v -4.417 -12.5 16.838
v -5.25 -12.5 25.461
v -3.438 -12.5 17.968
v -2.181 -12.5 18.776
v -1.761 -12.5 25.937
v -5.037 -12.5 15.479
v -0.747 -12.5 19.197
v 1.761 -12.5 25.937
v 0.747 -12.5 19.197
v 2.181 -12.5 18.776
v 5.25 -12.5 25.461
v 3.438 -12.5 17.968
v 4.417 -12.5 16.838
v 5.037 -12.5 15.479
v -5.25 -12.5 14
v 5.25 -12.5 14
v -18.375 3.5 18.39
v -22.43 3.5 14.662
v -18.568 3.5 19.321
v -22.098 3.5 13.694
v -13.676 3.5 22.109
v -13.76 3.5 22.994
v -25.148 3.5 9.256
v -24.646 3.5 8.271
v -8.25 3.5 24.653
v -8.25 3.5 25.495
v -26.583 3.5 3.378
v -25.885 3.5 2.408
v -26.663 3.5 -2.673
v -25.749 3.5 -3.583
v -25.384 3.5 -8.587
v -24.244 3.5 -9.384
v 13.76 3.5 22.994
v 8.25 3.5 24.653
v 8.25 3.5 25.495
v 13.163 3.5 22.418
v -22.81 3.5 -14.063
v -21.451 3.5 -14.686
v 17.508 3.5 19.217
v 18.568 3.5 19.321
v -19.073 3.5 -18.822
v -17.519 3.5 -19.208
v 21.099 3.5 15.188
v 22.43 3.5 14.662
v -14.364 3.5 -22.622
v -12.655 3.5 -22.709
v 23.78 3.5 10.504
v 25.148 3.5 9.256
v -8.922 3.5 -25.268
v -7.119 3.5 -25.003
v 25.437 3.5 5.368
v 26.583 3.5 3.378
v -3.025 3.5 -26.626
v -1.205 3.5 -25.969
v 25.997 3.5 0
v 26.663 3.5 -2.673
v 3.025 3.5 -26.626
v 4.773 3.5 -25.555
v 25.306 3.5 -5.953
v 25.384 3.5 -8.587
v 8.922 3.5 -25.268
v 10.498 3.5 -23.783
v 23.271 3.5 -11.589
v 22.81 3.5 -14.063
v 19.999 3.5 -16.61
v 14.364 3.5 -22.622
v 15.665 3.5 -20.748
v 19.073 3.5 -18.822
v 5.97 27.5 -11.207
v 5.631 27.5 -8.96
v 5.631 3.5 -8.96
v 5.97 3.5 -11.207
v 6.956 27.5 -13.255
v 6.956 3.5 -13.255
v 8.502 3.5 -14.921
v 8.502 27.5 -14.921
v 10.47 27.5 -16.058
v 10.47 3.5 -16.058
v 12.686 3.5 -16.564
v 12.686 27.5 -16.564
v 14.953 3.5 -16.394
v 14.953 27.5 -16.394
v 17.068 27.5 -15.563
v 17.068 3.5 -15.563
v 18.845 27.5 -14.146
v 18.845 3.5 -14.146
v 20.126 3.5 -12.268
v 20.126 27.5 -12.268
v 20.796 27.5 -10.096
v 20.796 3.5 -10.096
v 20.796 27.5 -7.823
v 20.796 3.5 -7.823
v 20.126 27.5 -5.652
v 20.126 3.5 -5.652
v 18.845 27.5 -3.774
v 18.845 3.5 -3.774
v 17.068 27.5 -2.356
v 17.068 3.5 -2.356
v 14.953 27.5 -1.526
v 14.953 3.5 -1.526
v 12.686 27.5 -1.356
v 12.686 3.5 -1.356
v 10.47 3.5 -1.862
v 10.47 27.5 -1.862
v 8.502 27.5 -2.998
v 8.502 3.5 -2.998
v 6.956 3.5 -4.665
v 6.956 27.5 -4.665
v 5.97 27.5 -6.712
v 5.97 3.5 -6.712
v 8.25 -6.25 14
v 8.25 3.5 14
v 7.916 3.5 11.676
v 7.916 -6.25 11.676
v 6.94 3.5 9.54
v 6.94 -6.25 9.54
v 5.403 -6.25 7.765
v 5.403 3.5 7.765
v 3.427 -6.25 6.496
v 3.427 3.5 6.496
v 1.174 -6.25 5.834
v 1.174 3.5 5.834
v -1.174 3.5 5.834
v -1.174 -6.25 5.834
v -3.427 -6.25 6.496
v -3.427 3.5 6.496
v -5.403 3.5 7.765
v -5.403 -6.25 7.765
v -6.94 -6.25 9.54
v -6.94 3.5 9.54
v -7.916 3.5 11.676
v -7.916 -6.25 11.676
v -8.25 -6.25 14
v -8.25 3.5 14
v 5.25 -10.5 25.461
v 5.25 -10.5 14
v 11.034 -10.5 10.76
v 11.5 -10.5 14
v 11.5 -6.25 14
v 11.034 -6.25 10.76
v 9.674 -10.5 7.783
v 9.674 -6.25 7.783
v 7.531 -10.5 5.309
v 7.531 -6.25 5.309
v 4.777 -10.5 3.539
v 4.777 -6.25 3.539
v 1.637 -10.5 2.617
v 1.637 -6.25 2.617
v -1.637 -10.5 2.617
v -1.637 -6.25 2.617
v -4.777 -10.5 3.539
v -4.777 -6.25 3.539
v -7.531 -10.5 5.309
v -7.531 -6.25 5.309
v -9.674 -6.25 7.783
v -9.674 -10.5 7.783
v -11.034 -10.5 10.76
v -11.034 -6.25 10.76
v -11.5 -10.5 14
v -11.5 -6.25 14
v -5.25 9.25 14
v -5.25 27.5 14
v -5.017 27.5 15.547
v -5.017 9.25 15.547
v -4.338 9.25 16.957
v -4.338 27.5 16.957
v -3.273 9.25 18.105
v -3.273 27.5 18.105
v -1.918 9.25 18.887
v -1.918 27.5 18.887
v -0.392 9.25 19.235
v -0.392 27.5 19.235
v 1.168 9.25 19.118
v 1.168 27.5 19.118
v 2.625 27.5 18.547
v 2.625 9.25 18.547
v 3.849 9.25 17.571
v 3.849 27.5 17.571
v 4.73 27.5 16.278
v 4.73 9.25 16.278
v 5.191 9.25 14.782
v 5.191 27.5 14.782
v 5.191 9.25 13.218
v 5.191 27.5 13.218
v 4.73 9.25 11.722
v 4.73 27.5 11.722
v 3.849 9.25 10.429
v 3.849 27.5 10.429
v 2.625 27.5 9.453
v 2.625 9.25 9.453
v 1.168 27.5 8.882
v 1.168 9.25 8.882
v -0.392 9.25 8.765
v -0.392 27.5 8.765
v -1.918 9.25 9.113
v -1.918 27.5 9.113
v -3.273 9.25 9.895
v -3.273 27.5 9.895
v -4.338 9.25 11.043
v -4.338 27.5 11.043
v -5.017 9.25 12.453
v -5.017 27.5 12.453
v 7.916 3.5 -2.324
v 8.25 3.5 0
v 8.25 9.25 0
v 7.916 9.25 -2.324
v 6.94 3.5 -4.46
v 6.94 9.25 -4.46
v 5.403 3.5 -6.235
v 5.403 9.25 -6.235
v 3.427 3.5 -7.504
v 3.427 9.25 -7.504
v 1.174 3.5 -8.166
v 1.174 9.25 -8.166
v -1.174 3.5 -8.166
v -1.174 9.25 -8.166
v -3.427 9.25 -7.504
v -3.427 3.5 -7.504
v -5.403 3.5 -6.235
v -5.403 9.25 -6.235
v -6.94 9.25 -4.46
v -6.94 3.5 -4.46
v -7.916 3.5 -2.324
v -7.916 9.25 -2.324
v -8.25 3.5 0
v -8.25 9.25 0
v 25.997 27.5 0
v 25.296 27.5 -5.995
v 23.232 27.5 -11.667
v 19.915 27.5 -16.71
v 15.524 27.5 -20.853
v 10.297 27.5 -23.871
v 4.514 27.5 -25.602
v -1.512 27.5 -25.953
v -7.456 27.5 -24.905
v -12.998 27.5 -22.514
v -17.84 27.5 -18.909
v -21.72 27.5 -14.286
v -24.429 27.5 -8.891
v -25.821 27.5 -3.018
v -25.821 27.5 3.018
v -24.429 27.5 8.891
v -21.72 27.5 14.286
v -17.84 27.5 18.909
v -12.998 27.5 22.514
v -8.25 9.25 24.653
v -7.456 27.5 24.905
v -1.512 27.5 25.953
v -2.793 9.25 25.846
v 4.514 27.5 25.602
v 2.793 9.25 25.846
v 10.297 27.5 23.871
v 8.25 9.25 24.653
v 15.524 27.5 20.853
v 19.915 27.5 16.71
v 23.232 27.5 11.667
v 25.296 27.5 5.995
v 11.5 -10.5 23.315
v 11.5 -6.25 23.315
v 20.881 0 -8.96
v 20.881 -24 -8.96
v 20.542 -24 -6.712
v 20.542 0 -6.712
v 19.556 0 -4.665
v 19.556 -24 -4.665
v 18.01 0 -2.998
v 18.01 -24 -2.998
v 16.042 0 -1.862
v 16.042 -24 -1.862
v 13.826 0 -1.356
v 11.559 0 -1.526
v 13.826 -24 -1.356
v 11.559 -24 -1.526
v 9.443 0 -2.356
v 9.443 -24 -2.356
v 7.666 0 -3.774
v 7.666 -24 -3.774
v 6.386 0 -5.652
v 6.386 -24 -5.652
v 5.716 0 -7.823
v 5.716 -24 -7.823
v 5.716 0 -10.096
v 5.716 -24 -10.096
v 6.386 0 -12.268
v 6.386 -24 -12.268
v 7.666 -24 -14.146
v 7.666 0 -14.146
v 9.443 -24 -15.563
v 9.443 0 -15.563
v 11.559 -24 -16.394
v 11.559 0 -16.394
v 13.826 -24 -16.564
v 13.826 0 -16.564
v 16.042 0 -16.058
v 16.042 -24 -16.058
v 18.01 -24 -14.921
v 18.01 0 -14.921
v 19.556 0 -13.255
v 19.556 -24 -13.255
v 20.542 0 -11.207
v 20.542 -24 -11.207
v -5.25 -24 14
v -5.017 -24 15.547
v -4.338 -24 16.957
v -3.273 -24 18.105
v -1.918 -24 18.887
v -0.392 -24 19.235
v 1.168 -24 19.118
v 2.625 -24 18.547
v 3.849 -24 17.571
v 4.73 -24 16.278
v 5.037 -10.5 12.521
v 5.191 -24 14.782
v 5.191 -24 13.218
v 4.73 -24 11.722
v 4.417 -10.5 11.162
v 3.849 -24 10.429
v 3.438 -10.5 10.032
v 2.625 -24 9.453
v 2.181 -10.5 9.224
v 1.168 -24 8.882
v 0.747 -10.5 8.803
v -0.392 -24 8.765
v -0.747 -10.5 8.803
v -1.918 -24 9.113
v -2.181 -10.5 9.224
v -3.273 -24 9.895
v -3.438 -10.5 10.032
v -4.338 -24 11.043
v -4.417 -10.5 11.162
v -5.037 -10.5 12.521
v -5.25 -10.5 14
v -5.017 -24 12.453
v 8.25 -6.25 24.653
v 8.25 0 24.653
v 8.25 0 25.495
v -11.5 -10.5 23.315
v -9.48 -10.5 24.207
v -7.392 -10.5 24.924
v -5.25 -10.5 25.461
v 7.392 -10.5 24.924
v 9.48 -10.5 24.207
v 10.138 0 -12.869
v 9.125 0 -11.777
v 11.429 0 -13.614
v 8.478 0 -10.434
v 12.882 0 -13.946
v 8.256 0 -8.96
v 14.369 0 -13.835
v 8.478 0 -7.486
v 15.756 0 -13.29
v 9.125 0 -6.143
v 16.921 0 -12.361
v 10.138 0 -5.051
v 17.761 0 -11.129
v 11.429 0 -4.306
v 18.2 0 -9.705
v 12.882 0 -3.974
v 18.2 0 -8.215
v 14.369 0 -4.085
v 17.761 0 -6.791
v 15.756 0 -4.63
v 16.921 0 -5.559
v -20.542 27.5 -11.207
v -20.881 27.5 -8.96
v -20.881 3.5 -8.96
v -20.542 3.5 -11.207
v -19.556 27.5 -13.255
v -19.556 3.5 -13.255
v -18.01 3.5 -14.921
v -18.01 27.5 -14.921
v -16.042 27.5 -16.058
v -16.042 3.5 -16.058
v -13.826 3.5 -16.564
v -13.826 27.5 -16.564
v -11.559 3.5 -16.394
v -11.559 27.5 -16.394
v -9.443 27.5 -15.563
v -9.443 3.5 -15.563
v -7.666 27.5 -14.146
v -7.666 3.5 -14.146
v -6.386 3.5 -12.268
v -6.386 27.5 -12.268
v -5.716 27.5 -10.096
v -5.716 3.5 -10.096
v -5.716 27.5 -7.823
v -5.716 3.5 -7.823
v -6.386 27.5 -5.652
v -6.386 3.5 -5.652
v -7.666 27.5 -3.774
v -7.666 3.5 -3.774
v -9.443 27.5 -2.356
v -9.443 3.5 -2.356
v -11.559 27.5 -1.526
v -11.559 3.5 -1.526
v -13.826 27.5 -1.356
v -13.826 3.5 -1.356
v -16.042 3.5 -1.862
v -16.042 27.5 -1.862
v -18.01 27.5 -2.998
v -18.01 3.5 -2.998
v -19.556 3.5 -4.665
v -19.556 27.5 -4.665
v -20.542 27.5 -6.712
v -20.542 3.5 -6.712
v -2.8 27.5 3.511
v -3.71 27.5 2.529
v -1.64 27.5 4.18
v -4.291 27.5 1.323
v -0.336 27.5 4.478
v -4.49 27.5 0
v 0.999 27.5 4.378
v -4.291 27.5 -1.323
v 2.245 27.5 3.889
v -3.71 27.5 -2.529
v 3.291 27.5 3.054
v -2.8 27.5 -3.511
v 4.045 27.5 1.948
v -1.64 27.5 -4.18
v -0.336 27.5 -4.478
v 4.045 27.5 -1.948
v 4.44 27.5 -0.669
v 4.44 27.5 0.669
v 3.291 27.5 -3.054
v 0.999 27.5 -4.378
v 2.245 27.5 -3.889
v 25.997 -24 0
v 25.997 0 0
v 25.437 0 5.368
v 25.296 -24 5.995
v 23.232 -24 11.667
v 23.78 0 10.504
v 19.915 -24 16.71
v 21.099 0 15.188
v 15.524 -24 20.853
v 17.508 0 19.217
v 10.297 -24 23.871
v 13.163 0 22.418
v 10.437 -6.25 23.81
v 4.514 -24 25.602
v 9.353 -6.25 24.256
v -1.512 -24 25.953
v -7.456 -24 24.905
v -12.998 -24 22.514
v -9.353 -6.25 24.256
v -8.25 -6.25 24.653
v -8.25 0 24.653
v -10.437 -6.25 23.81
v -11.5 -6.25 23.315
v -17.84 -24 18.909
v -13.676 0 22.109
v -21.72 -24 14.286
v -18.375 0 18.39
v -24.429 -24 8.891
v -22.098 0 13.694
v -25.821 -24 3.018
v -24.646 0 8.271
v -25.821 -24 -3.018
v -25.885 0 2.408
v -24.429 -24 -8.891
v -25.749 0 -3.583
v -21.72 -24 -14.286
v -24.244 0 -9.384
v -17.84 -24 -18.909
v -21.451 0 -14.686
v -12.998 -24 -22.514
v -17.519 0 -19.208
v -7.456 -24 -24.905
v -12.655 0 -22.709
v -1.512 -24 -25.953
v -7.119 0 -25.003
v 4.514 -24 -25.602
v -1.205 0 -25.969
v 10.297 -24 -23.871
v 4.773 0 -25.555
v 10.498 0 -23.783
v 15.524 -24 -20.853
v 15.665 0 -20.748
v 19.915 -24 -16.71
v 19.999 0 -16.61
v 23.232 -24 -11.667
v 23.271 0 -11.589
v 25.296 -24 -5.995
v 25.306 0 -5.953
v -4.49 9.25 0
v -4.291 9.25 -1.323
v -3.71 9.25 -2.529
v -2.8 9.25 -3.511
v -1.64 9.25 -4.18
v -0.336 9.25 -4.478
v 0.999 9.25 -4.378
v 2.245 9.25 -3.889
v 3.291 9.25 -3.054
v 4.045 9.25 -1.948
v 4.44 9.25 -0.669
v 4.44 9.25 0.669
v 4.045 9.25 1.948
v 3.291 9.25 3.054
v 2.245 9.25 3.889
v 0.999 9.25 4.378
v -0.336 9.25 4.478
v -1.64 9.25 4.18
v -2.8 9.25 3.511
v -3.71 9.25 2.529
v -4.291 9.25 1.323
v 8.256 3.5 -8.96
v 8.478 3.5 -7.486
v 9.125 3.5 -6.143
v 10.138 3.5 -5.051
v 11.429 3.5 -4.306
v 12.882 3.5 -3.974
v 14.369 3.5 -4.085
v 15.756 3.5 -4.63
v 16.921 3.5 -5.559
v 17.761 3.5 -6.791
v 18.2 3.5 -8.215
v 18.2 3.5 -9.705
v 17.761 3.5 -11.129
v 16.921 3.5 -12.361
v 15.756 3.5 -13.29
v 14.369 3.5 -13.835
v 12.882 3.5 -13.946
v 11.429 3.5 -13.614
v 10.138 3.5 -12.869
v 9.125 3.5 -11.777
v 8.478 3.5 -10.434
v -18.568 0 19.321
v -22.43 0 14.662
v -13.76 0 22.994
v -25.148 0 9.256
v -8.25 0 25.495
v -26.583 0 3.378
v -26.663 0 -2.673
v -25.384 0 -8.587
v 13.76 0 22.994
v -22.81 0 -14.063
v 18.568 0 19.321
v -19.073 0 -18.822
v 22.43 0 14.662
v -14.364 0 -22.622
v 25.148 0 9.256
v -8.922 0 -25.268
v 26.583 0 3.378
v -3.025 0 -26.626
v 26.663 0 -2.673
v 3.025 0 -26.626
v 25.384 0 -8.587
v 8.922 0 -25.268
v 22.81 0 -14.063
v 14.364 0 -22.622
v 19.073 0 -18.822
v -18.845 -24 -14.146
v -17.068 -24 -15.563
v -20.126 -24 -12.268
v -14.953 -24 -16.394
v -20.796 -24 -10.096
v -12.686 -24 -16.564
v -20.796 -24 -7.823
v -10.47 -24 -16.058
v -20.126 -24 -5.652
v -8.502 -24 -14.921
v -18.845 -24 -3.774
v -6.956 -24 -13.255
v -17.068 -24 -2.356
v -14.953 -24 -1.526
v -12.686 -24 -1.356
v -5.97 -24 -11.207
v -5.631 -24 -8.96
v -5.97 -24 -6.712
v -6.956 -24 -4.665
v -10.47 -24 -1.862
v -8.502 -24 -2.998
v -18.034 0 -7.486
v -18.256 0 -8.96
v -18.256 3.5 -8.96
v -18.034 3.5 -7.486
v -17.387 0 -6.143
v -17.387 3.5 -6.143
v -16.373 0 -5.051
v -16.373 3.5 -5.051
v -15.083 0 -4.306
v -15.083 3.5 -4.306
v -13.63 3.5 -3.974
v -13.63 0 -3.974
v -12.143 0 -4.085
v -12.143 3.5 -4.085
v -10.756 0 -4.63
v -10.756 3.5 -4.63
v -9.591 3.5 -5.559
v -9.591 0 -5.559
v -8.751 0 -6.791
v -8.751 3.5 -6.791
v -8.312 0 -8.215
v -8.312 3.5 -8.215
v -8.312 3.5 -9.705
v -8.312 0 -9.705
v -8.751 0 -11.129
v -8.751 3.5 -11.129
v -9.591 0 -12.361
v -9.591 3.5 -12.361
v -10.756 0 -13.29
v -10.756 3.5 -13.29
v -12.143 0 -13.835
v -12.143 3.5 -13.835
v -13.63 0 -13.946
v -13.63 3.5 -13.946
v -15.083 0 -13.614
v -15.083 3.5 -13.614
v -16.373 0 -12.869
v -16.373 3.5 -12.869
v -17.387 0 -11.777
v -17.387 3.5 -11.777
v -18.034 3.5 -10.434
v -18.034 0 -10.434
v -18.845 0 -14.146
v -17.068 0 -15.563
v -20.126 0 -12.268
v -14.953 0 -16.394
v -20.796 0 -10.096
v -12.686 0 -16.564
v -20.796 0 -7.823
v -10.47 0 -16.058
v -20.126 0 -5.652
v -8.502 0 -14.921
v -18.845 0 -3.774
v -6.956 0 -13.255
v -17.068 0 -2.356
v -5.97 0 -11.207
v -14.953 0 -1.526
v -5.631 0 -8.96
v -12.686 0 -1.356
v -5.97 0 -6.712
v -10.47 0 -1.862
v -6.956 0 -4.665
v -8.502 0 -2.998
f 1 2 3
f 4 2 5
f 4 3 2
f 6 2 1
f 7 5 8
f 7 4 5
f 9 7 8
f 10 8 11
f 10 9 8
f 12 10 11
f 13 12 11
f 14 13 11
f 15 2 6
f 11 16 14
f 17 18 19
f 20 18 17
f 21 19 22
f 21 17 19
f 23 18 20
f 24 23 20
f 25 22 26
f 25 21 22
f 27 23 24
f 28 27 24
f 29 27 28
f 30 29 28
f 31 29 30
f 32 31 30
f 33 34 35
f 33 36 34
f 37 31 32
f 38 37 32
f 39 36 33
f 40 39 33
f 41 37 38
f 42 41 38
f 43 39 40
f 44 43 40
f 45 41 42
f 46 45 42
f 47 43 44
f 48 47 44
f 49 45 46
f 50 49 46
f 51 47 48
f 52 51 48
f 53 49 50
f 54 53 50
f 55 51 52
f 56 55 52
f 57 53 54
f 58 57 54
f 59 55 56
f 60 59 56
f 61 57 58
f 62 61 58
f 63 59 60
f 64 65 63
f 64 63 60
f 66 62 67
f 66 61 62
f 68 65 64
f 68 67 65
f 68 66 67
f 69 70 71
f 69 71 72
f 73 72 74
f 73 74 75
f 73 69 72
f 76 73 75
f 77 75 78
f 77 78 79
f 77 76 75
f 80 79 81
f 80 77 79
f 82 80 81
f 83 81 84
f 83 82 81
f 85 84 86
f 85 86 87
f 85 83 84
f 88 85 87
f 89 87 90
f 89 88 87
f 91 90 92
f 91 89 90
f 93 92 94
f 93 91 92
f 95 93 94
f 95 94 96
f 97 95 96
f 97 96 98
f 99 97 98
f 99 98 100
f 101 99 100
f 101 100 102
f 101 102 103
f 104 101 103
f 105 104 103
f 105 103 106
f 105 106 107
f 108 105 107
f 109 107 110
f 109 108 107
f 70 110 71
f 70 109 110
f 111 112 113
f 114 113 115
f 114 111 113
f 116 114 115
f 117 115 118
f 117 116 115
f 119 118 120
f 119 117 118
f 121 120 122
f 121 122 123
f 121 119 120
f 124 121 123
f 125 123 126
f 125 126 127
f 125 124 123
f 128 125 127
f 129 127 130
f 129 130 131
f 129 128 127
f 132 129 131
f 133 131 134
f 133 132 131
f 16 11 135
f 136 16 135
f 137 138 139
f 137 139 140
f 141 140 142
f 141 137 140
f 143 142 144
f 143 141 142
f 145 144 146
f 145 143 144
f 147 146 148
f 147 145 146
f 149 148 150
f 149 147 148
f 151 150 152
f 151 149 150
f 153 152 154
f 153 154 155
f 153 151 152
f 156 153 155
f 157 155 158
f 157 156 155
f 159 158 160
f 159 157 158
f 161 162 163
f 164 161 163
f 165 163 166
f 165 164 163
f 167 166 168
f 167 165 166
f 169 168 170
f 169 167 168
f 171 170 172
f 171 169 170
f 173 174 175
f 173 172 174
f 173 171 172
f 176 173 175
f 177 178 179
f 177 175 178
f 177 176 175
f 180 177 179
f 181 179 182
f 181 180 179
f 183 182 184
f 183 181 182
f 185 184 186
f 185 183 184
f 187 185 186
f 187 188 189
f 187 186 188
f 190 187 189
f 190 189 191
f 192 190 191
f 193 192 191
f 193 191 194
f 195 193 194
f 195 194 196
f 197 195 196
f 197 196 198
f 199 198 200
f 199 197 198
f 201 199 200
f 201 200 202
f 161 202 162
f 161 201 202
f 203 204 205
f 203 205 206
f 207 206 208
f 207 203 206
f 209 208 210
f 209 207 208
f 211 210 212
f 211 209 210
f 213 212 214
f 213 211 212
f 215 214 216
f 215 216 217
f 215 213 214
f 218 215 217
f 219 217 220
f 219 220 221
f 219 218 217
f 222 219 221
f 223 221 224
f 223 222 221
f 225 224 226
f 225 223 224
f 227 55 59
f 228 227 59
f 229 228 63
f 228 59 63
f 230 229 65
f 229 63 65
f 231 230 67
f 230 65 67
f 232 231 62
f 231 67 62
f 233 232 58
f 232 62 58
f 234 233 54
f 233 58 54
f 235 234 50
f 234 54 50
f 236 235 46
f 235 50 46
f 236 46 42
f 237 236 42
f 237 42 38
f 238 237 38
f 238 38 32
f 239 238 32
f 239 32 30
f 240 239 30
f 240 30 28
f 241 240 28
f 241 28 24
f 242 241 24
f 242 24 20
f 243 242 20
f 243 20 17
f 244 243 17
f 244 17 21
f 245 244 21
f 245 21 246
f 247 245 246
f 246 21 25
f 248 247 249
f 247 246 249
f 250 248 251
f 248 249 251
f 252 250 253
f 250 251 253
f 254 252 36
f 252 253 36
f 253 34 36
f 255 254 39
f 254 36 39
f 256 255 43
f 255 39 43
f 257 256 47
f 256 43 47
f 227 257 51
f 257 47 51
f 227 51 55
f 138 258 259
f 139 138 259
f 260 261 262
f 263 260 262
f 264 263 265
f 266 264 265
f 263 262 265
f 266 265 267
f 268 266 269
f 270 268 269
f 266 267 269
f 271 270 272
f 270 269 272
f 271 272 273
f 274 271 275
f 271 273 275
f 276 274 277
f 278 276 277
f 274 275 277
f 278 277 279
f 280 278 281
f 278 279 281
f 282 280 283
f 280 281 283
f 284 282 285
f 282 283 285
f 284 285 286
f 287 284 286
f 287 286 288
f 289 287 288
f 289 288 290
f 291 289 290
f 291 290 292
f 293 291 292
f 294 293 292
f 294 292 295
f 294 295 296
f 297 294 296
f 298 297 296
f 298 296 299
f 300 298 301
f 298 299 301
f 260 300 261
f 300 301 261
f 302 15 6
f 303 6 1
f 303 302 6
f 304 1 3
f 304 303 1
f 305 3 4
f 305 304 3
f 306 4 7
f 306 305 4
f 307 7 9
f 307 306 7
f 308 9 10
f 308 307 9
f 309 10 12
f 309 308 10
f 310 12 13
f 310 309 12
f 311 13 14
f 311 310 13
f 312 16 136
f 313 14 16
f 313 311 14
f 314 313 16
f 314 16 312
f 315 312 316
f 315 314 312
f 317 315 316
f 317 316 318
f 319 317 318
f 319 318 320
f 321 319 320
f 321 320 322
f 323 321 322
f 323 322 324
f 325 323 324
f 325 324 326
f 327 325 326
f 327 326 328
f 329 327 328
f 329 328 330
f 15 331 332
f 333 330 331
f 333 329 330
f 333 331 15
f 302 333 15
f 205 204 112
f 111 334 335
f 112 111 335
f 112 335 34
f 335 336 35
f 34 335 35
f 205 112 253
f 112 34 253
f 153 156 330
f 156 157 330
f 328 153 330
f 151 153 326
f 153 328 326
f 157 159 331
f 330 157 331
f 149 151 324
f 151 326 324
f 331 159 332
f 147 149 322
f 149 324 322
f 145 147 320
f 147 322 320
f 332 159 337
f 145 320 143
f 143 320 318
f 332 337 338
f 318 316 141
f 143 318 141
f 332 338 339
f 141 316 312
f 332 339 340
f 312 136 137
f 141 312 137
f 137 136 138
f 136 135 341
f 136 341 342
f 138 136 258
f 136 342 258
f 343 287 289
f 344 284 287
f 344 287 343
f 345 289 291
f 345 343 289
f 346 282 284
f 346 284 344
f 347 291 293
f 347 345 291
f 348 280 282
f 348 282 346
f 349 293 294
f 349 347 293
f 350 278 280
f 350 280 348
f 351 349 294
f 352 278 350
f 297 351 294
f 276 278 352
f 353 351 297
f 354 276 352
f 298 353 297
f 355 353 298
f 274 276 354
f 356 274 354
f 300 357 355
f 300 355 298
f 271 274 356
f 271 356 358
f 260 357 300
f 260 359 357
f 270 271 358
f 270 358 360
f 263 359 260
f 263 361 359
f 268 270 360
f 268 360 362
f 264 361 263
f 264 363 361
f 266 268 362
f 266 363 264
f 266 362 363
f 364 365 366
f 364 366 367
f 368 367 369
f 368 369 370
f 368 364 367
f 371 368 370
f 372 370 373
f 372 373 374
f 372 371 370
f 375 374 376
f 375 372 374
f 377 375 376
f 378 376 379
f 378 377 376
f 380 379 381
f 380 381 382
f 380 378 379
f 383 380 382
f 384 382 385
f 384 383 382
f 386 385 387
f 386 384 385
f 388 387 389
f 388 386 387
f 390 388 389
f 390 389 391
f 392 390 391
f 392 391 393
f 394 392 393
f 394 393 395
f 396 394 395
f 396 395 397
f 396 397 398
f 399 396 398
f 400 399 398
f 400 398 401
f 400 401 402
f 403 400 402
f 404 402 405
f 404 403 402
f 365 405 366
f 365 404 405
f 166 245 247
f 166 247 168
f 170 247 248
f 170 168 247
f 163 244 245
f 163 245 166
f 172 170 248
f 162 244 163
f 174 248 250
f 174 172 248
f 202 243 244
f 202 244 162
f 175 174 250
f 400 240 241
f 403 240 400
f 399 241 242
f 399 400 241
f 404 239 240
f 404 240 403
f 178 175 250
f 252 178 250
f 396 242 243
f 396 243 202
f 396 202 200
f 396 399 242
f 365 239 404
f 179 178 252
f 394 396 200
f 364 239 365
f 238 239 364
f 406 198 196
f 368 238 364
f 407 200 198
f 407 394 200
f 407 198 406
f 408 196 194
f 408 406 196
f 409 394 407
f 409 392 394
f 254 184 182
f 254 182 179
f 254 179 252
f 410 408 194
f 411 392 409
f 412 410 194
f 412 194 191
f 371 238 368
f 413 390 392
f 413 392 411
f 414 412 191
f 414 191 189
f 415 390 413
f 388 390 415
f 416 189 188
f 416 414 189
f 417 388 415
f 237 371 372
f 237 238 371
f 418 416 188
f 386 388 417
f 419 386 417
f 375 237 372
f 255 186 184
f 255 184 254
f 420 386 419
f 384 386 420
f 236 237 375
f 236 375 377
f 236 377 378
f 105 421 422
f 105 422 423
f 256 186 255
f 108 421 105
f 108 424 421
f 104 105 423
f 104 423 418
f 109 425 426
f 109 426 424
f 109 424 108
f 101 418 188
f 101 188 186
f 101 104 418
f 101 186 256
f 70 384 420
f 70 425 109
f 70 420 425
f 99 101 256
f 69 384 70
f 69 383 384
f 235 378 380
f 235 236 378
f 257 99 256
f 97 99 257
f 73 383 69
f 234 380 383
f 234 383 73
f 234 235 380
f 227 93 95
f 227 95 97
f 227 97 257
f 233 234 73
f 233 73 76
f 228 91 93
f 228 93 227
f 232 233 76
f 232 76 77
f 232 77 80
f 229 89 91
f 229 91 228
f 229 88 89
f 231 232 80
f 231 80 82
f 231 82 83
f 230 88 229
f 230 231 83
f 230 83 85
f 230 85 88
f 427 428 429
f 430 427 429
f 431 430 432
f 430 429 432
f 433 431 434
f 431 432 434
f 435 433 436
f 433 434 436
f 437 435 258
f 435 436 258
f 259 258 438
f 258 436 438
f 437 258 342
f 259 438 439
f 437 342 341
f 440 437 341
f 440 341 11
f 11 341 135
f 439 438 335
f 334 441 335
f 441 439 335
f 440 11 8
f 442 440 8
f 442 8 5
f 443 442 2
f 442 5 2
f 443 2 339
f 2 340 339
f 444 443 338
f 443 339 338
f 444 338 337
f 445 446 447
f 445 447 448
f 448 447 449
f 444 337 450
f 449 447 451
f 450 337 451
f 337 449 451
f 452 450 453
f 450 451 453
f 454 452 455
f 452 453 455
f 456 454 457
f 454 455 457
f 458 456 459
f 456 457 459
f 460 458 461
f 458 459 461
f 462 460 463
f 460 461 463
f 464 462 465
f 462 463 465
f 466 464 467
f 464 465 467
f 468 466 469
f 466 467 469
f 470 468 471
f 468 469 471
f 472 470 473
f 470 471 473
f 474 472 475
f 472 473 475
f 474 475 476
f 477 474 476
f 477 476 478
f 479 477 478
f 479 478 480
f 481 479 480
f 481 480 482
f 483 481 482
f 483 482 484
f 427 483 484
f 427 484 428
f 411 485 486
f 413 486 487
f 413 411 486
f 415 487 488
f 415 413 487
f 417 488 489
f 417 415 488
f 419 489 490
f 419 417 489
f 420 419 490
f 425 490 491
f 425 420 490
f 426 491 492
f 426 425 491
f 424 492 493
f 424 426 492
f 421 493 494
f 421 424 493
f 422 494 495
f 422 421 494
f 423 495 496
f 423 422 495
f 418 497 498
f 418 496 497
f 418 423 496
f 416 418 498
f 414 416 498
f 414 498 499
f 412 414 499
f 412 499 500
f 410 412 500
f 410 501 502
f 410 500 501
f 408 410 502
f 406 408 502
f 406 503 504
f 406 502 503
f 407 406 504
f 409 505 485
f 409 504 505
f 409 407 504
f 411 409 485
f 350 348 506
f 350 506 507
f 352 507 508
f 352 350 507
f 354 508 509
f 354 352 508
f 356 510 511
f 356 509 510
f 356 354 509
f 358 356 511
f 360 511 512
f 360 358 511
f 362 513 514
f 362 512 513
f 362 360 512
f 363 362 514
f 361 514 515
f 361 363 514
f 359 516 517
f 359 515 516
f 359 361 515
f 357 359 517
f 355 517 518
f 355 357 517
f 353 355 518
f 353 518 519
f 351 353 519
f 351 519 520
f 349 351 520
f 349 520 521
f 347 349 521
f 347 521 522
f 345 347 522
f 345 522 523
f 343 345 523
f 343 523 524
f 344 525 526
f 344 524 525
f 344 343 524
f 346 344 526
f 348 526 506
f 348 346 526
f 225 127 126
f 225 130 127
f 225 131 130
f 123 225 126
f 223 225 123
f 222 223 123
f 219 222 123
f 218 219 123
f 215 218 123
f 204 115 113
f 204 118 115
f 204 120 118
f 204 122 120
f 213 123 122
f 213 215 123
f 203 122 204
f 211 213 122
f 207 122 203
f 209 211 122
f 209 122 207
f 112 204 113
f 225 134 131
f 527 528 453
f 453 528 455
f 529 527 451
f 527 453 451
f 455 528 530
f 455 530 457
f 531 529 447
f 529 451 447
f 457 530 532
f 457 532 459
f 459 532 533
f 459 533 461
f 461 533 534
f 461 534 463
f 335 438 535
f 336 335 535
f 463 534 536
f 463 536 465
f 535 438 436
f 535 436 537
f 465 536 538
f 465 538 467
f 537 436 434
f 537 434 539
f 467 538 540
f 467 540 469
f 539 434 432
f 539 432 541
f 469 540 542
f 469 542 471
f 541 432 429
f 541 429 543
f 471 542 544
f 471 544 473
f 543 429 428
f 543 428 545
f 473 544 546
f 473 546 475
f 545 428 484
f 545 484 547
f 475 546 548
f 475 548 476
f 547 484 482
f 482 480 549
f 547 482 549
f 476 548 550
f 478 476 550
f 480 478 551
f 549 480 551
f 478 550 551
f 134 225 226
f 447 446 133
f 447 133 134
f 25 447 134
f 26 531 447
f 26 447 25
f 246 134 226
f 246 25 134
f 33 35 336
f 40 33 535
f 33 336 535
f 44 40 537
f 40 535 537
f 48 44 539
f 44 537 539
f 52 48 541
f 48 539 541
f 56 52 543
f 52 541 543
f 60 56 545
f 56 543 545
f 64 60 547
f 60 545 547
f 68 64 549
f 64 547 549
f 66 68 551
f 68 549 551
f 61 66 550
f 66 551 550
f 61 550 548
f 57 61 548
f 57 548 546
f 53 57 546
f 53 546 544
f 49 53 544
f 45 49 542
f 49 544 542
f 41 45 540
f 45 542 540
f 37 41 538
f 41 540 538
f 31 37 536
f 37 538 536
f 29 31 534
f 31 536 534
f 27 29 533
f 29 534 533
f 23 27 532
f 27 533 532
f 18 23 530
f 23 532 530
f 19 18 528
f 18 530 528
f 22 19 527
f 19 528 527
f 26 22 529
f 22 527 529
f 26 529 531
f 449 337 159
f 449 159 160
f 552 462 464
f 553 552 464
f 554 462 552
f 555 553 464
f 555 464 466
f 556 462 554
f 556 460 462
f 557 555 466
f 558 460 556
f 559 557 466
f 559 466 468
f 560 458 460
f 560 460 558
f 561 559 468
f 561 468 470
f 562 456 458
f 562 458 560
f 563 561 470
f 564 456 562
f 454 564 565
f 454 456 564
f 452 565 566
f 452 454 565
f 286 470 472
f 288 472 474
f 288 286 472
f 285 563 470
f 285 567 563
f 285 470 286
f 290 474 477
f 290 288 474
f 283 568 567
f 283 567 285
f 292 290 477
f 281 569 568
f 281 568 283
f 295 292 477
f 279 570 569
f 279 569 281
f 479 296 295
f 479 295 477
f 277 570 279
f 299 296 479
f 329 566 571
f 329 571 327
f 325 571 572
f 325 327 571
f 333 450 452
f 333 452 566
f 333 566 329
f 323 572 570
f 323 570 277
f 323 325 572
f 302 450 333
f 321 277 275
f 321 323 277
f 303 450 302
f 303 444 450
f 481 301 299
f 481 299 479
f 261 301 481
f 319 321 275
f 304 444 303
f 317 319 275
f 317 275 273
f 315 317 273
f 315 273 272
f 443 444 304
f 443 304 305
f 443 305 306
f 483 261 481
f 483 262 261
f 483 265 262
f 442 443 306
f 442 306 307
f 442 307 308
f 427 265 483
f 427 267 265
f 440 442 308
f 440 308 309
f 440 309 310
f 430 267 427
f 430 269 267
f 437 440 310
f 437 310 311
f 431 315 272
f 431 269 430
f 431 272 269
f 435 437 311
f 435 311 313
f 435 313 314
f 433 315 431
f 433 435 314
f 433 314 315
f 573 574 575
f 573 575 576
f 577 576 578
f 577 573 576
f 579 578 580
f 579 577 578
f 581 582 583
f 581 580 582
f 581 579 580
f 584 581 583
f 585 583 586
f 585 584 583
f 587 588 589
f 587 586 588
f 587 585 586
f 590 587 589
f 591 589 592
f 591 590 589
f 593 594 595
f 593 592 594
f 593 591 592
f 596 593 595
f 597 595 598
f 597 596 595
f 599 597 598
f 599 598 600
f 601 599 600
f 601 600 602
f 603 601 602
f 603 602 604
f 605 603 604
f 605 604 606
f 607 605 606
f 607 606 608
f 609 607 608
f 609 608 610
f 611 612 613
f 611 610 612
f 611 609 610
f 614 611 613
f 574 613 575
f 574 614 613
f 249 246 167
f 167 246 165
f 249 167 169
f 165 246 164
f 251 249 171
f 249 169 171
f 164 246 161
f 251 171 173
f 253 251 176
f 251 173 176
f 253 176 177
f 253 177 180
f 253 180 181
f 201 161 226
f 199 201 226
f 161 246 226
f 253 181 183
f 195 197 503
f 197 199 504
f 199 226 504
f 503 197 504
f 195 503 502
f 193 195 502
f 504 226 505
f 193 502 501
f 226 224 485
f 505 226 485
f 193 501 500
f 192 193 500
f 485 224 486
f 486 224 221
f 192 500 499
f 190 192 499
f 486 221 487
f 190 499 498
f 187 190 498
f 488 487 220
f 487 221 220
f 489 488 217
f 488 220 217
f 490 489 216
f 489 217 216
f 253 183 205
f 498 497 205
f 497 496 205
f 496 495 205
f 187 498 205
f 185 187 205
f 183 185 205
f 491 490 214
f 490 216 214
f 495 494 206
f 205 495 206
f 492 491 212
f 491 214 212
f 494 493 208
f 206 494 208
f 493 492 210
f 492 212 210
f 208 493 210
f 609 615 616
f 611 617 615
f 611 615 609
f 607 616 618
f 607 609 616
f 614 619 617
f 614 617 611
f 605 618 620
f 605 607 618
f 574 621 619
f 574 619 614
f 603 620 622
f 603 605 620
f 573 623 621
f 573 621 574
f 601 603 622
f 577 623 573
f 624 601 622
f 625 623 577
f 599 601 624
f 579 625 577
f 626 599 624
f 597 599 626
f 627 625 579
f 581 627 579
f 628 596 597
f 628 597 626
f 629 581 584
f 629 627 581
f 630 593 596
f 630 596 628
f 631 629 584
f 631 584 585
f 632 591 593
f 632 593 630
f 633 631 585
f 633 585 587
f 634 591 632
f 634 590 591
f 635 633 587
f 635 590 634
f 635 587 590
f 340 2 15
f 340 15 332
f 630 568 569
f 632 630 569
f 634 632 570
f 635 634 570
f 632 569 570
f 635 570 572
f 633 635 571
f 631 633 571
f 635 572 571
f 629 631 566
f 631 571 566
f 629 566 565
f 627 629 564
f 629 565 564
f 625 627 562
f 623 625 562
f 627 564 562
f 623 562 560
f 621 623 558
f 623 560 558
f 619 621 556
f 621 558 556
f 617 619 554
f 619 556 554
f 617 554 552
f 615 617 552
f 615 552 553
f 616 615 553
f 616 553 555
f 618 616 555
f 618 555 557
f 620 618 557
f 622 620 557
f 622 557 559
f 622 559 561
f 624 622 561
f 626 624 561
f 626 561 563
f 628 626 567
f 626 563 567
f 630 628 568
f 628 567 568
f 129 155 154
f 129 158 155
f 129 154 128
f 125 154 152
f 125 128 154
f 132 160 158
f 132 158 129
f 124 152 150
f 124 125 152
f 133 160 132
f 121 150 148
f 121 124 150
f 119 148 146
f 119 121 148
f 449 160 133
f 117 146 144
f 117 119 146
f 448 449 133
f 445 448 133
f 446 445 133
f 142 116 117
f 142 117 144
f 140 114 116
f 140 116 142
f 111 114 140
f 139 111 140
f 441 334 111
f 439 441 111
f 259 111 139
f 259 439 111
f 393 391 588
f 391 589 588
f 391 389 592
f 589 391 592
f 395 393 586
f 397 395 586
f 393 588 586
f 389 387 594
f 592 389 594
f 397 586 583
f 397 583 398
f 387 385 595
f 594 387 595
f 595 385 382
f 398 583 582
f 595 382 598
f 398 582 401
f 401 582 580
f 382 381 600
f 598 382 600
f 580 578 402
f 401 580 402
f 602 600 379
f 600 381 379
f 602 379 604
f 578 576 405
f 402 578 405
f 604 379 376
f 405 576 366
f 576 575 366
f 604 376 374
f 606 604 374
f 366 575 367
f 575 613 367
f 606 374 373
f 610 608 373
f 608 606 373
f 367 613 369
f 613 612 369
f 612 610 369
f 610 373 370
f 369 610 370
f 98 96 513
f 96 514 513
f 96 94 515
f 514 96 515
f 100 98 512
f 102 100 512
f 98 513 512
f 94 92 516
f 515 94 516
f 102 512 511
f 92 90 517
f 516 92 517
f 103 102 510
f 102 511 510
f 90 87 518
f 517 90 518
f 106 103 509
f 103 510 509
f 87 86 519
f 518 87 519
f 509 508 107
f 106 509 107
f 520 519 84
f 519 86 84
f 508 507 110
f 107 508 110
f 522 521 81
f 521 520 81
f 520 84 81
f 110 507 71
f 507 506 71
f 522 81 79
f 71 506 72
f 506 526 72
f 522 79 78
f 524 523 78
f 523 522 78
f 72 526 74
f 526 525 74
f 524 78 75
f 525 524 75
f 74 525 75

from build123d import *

# Parameters (mm, degrees)
SKETCH1_R           = 26.797
BOSS_EXTRUDE1_DEPTH = 3.5
SKETCH2_R           = 25.9969
BOSS_EXTRUDE2_DEPTH = 24
SKETCH3_R           = 25.9969
BOSS_EXTRUDE3_DEPTH = 24
SKETCH4_R           = 7.625
CUT_EXTRUDE1_DEPTH  = 24
SKETCH5_R           = 7.625
SKETCH5_R_2         = 4.490128061
CUT_EXTRUDE2_DEPTH  = 24
SKETCH6_R           = 5.25
SKETCH6_R_2         = 5
CUT_EXTRUDE4_DEPTH  = 52.5
CUT_EXTRUDE5_START  = -26.797
SKETCH7_W           = 16.5
SKETCH7_H           = 5.75
CUT_EXTRUDE5_DEPTH  = 25.9969
CUT_EXTRUDE6_DEPTH  = 5.75
SKETCH13_W          = 16.5
SKETCH13_H          = 9.75
CUT_EXTRUDE10_DEPTH = 12.797
CUT_EXTRUDE11_DEPTH = 9.75
SKETCH9_W           = 23
SKETCH9_H           = 4.25
CUT_EXTRUDE7_DEPTH  = 12.797
CUT_EXTRUDE8_DEPTH  = 4.25
CUT_EXTRUDE9_START  = -12.797
SKETCH12_W          = 10.5
SKETCH12_H          = 2
CUT_EXTRUDE9_DEPTH  = 11.9969


with BuildPart() as part:
    # Sketch1 → Boss-Extrude1 (new body)
    with BuildSketch(Plane(origin=(0, 0, 0), x_dir=(1, 0, 0), z_dir=(0, 1, 0))):
        Circle(SKETCH1_R)
    extrude(amount=BOSS_EXTRUDE1_DEPTH)

    # Sketch2 → Boss-Extrude2 (add)
    with BuildSketch(Plane(origin=(0, 3.5, 0), x_dir=(1, 0, 0), z_dir=(0, 1, 0))):
        Circle(SKETCH2_R)
    extrude(amount=BOSS_EXTRUDE2_DEPTH)

    # Sketch3 → Boss-Extrude3 (add)
    with BuildSketch(Plane.XZ):
        Circle(SKETCH3_R)
    extrude(amount=BOSS_EXTRUDE3_DEPTH)

    # Sketch4 → Cut-Extrude1 (cut)
    with BuildSketch(Plane.XZ.offset(24)):
        with Locations((-13.255925111, -8.959935794)):
            Circle(SKETCH4_R)
        with Locations((13.255925111, -8.959935794)):
            Circle(SKETCH4_R)
    extrude(amount=-CUT_EXTRUDE1_DEPTH, mode=Mode.SUBTRACT)

    # Sketch5 → Cut-Extrude2 (cut)
    with BuildSketch(Plane(origin=(0, 27.5, -30.35), x_dir=(-1, 0, 0), z_dir=(0, -1, 0))):
        with Locations((-13.255925111, -21.390064206)):
            Circle(SKETCH5_R)
        with Locations((13.255925111, -21.390064206)):
            Circle(SKETCH5_R)
        with Locations((0, -30.35)):
            Circle(SKETCH5_R_2)
    extrude(amount=CUT_EXTRUDE2_DEPTH, mode=Mode.SUBTRACT)

    # Sketch6 → Cut-Extrude4 (cut, through all)
    with BuildSketch(Plane(origin=(0, -24, -24), x_dir=(-1, 0, 0), z_dir=(0, 1, 0))):
        with Locations((0, 38)):
            Circle(SKETCH6_R)
        with Locations((-13.255925111, 15.040064206)):
            Circle(SKETCH6_R_2)
        with Locations((13.255925111, 15.040064206)):
            Circle(SKETCH6_R_2)
    extrude(amount=CUT_EXTRUDE4_DEPTH, mode=Mode.SUBTRACT)

    # Sketch7 → Cut-Extrude5 (cut)
    with BuildSketch(Plane.XY.offset(26.797).offset(CUT_EXTRUDE5_START)):
        with Locations((0, 6.375)):
            Rectangle(SKETCH7_W, SKETCH7_H)
    extrude(amount=CUT_EXTRUDE5_DEPTH, mode=Mode.SUBTRACT)

    # Sketch8 → Cut-Extrude6 (cut)
    with BuildSketch(Plane(origin=(0, 3.5, 0), x_dir=(1, 0, 0), z_dir=(0, 1, 0))):
        with BuildLine():
            Line((-8.25, 0), (8.25, 0))
            ThreePointArc((8.25, 0), (0, 8.25), (-8.25, 0))
        make_face()
    extrude(amount=CUT_EXTRUDE6_DEPTH, mode=Mode.SUBTRACT)

    # Sketch13 → Cut-Extrude10 (cut)
    with BuildSketch(Plane.XY.offset(26.797)):
        with Locations((0, -1.375)):
            Rectangle(SKETCH13_W, SKETCH13_H)
    extrude(amount=-CUT_EXTRUDE10_DEPTH, mode=Mode.SUBTRACT)

    # Sketch14 → Cut-Extrude11 (cut)
    with BuildSketch(Plane(origin=(0, -6.25, 0), x_dir=(1, 0, 0), z_dir=(0, 1, 0))):
        with BuildLine():
            Line((-8.25, -14), (8.25, -14))
            ThreePointArc((8.25, -14), (0, -5.75), (-8.25, -14))
        make_face()
    extrude(amount=CUT_EXTRUDE11_DEPTH, mode=Mode.SUBTRACT)

    # Sketch9 → Cut-Extrude7 (cut)
    with BuildSketch(Plane.XY.offset(26.797)):
        with Locations((0, -8.375)):
            Rectangle(SKETCH9_W, SKETCH9_H)
    extrude(amount=-CUT_EXTRUDE7_DEPTH, mode=Mode.SUBTRACT)

    # Sketch11 → Cut-Extrude8 (cut)
    with BuildSketch(Plane(origin=(0, -10.5, 0), x_dir=(1, 0, 0), z_dir=(0, 1, 0))):
        with BuildLine():
            Line((-11.5, -14), (11.5, -14))
            ThreePointArc((11.5, -14), (0, -2.5), (-11.5, -14))
        make_face()
    extrude(amount=CUT_EXTRUDE8_DEPTH, mode=Mode.SUBTRACT)

    # Sketch12 → Cut-Extrude9 (cut)
    with BuildSketch(Plane.XY.offset(26.797).offset(CUT_EXTRUDE9_START)):
        with Locations((0, -11.5)):
            Rectangle(SKETCH12_W, SKETCH12_H)
    extrude(amount=CUT_EXTRUDE9_DEPTH, mode=Mode.SUBTRACT)


solid = part.part
